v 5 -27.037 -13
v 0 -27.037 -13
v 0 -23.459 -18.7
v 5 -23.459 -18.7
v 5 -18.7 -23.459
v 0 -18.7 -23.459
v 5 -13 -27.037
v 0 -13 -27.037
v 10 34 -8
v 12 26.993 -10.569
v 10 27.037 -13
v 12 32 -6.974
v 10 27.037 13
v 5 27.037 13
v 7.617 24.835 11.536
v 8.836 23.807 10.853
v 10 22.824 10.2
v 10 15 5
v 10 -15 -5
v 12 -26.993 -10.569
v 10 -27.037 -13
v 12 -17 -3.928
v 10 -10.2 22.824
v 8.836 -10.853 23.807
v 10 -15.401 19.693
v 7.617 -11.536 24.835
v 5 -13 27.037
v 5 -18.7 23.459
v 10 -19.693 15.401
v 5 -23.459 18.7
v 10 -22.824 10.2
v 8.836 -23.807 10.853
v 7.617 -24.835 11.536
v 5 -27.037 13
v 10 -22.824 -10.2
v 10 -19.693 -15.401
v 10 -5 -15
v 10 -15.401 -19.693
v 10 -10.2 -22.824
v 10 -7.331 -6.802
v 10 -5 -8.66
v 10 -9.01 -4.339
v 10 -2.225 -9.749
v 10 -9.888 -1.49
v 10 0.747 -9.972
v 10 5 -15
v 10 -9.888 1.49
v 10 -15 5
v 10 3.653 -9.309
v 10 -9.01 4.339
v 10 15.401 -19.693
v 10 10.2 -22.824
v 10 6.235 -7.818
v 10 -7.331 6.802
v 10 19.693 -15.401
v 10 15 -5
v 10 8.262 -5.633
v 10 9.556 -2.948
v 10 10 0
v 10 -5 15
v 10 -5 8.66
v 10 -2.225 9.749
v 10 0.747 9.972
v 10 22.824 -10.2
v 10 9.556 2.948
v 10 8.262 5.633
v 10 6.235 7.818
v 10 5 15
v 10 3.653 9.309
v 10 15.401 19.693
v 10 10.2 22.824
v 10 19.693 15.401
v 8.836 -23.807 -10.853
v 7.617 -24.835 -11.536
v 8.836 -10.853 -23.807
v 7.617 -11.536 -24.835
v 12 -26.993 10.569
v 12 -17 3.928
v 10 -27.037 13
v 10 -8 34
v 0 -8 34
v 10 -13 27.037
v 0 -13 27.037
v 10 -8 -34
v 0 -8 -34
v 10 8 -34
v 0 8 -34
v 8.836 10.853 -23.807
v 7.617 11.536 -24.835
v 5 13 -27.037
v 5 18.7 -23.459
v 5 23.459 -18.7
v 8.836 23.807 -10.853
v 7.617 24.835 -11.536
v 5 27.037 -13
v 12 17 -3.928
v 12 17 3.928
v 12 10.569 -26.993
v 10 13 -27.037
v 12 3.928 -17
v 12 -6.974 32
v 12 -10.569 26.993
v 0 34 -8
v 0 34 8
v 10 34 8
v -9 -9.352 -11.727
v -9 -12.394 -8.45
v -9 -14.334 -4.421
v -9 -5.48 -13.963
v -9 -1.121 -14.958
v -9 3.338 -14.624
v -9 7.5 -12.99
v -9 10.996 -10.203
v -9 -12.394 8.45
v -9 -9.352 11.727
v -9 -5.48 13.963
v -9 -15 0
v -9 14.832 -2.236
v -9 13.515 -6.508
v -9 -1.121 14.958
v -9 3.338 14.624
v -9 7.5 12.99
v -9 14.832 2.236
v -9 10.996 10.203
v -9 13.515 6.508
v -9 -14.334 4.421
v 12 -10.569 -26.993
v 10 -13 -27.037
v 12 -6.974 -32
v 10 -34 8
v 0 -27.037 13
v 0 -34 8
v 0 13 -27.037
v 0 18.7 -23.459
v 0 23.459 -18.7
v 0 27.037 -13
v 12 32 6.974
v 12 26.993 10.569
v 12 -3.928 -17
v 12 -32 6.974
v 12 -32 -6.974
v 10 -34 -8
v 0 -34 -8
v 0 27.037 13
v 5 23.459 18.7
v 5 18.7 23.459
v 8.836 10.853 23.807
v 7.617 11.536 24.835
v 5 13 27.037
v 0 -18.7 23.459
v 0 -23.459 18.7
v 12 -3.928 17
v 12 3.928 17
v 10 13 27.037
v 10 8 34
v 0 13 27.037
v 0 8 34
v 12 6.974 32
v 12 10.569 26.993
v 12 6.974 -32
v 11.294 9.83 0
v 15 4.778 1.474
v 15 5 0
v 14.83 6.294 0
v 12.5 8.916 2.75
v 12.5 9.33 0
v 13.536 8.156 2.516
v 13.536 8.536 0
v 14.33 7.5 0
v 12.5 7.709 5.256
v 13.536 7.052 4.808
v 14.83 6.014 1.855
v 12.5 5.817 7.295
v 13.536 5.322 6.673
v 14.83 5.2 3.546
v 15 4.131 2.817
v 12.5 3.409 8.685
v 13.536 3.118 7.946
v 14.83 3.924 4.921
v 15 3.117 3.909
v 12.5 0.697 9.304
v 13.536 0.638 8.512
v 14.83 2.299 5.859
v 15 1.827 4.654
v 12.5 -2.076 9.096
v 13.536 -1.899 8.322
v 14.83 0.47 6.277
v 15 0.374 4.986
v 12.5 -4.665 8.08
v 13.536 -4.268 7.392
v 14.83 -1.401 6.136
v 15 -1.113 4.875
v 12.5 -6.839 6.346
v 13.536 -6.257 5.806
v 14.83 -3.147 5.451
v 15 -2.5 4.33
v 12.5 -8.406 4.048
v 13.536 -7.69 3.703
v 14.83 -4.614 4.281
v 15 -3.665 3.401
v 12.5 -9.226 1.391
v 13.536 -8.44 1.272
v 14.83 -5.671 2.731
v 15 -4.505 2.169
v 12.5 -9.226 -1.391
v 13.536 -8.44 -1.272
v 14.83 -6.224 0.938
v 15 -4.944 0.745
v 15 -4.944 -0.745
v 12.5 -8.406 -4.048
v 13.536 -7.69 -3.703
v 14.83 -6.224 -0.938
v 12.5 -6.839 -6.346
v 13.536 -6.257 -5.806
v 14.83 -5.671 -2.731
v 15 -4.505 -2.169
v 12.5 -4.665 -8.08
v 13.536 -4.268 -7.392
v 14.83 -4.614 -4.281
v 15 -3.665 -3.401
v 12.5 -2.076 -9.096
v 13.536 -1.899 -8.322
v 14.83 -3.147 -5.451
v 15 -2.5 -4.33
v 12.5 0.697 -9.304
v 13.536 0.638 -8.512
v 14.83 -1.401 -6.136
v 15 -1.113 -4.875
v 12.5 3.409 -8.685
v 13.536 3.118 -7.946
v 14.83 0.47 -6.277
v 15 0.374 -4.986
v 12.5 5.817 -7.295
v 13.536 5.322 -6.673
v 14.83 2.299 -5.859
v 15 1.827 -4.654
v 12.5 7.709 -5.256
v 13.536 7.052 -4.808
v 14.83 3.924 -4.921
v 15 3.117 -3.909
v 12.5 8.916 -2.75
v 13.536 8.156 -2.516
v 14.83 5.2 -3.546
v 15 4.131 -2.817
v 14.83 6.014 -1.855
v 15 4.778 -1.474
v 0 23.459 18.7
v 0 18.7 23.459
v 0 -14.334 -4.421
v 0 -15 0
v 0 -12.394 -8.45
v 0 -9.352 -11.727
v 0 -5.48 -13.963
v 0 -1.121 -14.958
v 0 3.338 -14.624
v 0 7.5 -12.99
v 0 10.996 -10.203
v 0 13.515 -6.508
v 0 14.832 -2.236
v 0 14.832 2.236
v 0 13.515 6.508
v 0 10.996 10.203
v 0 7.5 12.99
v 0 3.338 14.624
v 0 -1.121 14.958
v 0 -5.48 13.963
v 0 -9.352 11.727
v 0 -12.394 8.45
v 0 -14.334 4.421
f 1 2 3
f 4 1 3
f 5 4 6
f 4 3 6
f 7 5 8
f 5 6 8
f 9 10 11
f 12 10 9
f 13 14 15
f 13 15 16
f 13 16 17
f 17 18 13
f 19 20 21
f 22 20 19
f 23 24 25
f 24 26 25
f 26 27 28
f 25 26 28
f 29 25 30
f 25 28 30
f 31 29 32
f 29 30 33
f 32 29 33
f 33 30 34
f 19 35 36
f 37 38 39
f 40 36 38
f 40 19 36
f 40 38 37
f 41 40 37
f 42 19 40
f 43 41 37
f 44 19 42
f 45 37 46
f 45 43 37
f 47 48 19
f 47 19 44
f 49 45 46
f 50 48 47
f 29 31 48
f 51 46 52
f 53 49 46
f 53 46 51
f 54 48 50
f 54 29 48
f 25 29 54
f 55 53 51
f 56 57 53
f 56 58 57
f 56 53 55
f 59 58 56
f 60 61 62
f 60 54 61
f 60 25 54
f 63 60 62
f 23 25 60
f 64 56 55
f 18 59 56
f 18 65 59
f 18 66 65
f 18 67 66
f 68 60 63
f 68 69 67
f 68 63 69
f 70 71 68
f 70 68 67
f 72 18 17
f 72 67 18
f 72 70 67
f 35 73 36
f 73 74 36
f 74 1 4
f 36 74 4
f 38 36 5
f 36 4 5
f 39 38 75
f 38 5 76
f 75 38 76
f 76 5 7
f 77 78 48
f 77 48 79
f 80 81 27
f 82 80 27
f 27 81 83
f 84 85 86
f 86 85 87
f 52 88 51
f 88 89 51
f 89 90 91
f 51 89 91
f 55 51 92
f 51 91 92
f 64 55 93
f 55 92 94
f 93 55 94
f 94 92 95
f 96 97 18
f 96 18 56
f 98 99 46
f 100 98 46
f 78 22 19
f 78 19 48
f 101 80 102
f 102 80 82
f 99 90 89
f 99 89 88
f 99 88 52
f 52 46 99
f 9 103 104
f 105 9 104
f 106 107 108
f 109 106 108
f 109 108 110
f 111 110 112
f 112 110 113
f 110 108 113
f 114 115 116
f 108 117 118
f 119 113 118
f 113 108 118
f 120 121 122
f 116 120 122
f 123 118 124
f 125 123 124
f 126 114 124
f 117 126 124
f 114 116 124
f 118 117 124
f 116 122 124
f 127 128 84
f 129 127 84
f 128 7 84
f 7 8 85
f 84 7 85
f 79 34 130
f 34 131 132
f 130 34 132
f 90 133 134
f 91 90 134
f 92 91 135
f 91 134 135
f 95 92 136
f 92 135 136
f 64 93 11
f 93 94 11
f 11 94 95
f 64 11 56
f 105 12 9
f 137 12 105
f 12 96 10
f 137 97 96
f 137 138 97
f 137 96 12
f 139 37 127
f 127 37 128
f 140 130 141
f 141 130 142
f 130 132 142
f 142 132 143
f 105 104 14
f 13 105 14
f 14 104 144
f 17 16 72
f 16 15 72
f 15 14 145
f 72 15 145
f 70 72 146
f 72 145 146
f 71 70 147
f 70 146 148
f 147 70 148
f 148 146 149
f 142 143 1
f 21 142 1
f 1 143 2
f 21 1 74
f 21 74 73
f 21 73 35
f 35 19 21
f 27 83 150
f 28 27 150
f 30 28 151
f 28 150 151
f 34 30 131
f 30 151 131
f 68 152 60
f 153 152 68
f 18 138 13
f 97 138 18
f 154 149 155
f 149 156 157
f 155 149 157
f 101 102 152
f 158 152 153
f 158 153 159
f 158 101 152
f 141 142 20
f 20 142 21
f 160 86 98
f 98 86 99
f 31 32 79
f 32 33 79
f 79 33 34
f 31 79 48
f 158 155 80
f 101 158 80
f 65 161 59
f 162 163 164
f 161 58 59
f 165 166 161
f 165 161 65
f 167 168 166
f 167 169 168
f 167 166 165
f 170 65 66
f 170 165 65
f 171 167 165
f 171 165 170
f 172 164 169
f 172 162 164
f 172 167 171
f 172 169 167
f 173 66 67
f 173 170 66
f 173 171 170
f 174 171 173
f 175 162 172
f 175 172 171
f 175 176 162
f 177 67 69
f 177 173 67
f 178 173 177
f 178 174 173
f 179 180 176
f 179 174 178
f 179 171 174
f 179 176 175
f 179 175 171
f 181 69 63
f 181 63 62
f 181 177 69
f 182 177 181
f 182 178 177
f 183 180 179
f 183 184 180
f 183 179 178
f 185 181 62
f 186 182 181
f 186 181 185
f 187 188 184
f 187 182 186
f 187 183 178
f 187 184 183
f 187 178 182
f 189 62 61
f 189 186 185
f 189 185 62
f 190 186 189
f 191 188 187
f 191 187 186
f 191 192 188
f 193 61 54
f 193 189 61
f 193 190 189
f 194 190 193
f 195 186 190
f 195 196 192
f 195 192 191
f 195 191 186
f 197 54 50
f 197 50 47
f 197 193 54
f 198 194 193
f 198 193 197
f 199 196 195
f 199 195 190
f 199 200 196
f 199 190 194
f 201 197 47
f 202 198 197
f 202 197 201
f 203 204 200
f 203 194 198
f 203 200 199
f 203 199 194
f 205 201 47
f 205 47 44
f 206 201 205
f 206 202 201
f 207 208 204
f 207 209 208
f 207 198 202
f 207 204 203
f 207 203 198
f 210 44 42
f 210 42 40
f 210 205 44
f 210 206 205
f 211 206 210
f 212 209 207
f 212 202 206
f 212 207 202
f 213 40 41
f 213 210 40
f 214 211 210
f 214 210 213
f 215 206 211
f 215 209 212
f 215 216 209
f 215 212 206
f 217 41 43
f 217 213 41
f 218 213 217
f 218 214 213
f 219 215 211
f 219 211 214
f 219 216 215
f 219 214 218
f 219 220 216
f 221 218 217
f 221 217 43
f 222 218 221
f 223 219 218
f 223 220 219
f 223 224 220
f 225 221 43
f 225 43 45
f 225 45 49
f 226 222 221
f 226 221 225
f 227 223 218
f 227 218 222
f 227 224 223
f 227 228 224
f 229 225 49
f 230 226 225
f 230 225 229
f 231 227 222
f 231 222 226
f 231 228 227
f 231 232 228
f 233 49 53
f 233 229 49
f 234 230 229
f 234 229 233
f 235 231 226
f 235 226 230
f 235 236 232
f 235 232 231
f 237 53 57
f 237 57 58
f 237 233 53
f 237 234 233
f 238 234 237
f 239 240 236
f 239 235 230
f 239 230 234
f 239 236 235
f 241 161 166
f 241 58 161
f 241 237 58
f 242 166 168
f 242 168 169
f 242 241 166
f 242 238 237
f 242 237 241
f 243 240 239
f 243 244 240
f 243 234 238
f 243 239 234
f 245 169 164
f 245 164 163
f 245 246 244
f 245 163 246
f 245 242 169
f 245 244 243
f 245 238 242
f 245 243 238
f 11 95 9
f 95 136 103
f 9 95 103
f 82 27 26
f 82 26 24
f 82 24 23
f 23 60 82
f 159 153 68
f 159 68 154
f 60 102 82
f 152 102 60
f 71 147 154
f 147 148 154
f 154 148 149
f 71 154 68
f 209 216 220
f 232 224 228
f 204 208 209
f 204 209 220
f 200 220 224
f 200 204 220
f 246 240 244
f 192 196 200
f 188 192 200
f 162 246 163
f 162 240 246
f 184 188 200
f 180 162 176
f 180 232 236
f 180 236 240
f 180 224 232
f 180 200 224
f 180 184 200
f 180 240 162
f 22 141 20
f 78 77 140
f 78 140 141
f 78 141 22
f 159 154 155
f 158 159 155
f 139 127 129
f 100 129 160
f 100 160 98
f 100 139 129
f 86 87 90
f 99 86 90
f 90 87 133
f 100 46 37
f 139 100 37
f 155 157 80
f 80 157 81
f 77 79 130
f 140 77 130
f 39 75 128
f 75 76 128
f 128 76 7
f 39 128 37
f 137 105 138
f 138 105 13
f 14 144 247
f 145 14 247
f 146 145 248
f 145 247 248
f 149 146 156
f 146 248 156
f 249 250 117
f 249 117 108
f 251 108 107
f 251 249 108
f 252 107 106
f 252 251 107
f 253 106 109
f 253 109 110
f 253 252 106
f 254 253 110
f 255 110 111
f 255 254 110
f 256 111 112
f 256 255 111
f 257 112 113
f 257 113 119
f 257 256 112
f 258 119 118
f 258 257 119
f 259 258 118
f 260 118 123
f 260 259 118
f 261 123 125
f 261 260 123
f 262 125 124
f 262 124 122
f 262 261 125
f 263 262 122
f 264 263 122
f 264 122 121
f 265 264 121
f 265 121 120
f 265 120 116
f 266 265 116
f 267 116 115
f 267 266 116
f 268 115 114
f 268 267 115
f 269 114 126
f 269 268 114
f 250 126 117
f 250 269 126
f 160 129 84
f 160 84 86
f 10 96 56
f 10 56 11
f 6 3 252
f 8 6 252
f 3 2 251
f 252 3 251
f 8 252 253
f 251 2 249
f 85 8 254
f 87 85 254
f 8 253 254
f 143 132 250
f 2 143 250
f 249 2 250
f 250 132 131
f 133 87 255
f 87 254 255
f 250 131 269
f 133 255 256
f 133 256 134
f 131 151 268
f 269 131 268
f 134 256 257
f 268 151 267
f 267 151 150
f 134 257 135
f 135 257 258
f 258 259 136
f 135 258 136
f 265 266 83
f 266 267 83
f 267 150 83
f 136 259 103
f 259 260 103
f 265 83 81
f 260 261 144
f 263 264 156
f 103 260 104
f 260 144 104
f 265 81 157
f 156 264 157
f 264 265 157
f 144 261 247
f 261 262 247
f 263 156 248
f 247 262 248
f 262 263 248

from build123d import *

# Parameters (mm, degrees)
F1_DEPTH = 10
F2_DEPTH = 12
F3_SIZE  = 5
F4_SIZE  = 1.99999
F5_R     = 10
F6_DEPTH = 5
F7_R     = 4.99999
F9_DEPTH = 9


# Not quite as in the source:
# - a fillet or chamfer is up to 0.001 mm smaller than in the source, because OpenCascade refuses the exact size


with BuildPart() as f1:
    # F0 (on Right) → F1 (new body)
    with BuildSketch(Plane.YZ):
        with BuildLine():
            Line((15, 5), (27.0370116692, 13))
            ThreePointArc((27.0370116692, 13), (21.2132034356, 21.2132034356), (13, 27.0370116692))
            Line((13, 27.0370116692), (5, 15))
            Line((5, 15), (0, 15))
            Line((0, 15), (-5, 15))
            Line((-5, 15), (-13, 27.0370116692))
            ThreePointArc((-13, 27.0370116692), (-21.2132034356, 21.2132034356), (-27.0370116692, 13))
            Line((-27.0370116692, 13), (-15, 5))
            Line((-15, 5), (-15, 0))
            Line((-15, 0), (-15, -5))
            Line((-15, -5), (-27.0370116692, -13))
            ThreePointArc((-27.0370116692, -13), (-21.2132034356, -21.2132034356), (-13, -27.0370116692))
            Line((-13, -27.0370116692), (-5, -15))
            Line((-5, -15), (0, -15))
            Line((0, -15), (5, -15))
            Line((5, -15), (13, -27.0370116692))
            ThreePointArc((13, -27.0370116692), (21.2132034356, -21.2132034356), (27.0370116692, -13))
            Line((27.0370116692, -13), (15, -5))
            Line((15, -5), (15, 0))
            Line((15, 0), (15, 5))
        make_face()
    extrude(amount=F1_DEPTH)

    # F0 (on Right) → F2 (join)
    with BuildSketch(Plane.YZ):
        with BuildLine():
            ThreePointArc((27.0370116692, -13), (29.2498747867, -6.6666952054), (30, 0))
            ThreePointArc((30, 0), (29.2498747867, 6.6666952054), (27.0370116692, 13))
            Line((27.0370116692, 13), (15, 5))
            Line((15, 5), (15, 0))
            Line((15, 0), (15, -5))
            Line((15, -5), (27.0370116692, -13))
        make_face()
        with BuildLine():
            ThreePointArc((27.0370116692, 13), (29.2498747867, 6.6666952054), (30, 0))
            ThreePointArc((30, 0), (29.2498747867, -6.6666952054), (27.0370116692, -13))
            Line((27.0370116692, -13), (34, -8))
            Line((34, -8), (34, 0))
            Line((34, 0), (34, 8))
            Line((34, 8), (27.0370116692, 13))
        make_face()
        with BuildLine():
            Line((5, 15), (13, 27.0370116692))
            ThreePointArc((13, 27.0370116692), (0, 30), (-13, 27.0370116692))
            Line((-13, 27.0370116692), (-5, 15))
            Line((-5, 15), (0, 15))
            Line((0, 15), (5, 15))
        make_face()
        with BuildLine():
            ThreePointArc((-13, 27.0370116692), (0, 30), (13, 27.0370116692))
            Line((13, 27.0370116692), (8, 34))
            Line((8, 34), (0, 34))
            Line((0, 34), (-8, 34))
            Line((-8, 34), (-13, 27.0370116692))
        make_face()
        with BuildLine():
            Line((-15, 5), (-27.0370116692, 13))
            ThreePointArc((-27.0370116692, 13), (-30, 0), (-27.0370116692, -13))
            Line((-27.0370116692, -13), (-15, -5))
            Line((-15, -5), (-15, 0))
            Line((-15, 0), (-15, 5))
        make_face()
        with BuildLine():
            ThreePointArc((-27.0370116692, -13), (-30, 0), (-27.0370116692, 13))
            Line((-27.0370116692, 13), (-34, 8))
            Line((-34, 8), (-34, 0))
            Line((-34, 0), (-34, -8))
            Line((-34, -8), (-27.0370116692, -13))
        make_face()
        with BuildLine():
            ThreePointArc((-13, -27.0370116692), (0, -30), (13, -27.0370116692))
            Line((13, -27.0370116692), (5, -15))
            Line((5, -15), (0, -15))
            Line((0, -15), (-5, -15))
            Line((-5, -15), (-13, -27.0370116692))
        make_face()
        with BuildLine():
            Line((8, -34), (13, -27.0370116692))
            ThreePointArc((13, -27.0370116692), (0, -30), (-13, -27.0370116692))
            Line((-13, -27.0370116692), (-8, -34))
            Line((-8, -34), (0, -34))
            Line((0, -34), (8, -34))
        make_face()
    extrude(amount=F2_DEPTH)

    # F3
    f3_edges = [f1.edges().sort_by_distance(p)[0] for p in [
        (10, 21.213203, 21.213203),
        (10, -21.213203, 21.213203),
        (10, -21.213203, -21.213203),
        (10, 21.213203, -21.213203),
    ]]
    chamfer(f3_edges, length=F3_SIZE)

    # F4 (size 2 in the source; OpenCascade refuses exactly that, so slightly less here)
    f4_edges = [f1.edges().sort_by_distance(p)[0] for p in [
        (12, 0, 34),
        (12, -10.5, 30.518506),
        (12, 10.5, 30.518506),
        (12, -9, 21.018506),
        (12, 9, 21.018506),
        (12, 0, 15),
        (12, -15, 0),
        (12, -21.018506, 9),
        (12, -30.518506, 10.5),
        (12, -34, 0),
        (12, -30.518506, -10.5),
        (12, -21.018506, -9),
        (12, 0, -15),
        (12, -9, -21.018506),
        (12, -10.5, -30.518506),
        (12, 0, -34),
        (12, 10.5, -30.518506),
        (12, 9, -21.018506),
        (12, 15, 0),
        (12, 21.018506, 9),
        (12, 30.518506, 10.5),
        (12, 34, 0),
        (12, 21.018506, -9),
        (12, 30.518506, -10.5),
    ]]
    chamfer(f4_edges, length=F4_SIZE)

    # F5 (on face) → F6 (join)
    with BuildSketch(Plane.YZ.offset(10)):
        Circle(F5_R)
    extrude(amount=F6_DEPTH)

    # F7 (radius 5 in the source; OpenCascade refuses exactly that, so slightly less here)
    f7_edges = [f1.edges().sort_by_distance(p)[0] for p in [
        (15, -10, 0),
    ]]
    fillet(f7_edges, radius=F7_R)

    # F8 (on face) → F9 (join)
    with BuildSketch(Plane.YZ):
        with BuildLine():
            ThreePointArc((0, -15), (10.6066017178, -10.6066017178), (15, 0))
            ThreePointArc((15, 0), (10.6066017178, 10.6066017178), (0, 15))
            ThreePointArc((0, 15), (-10.6066017178, 10.6066017178), (-15, 0))
            ThreePointArc((-15, 0), (-10.6066017178, -10.6066017178), (0, -15))
        make_face()
    extrude(amount=-F9_DEPTH)


solid = f1.part
